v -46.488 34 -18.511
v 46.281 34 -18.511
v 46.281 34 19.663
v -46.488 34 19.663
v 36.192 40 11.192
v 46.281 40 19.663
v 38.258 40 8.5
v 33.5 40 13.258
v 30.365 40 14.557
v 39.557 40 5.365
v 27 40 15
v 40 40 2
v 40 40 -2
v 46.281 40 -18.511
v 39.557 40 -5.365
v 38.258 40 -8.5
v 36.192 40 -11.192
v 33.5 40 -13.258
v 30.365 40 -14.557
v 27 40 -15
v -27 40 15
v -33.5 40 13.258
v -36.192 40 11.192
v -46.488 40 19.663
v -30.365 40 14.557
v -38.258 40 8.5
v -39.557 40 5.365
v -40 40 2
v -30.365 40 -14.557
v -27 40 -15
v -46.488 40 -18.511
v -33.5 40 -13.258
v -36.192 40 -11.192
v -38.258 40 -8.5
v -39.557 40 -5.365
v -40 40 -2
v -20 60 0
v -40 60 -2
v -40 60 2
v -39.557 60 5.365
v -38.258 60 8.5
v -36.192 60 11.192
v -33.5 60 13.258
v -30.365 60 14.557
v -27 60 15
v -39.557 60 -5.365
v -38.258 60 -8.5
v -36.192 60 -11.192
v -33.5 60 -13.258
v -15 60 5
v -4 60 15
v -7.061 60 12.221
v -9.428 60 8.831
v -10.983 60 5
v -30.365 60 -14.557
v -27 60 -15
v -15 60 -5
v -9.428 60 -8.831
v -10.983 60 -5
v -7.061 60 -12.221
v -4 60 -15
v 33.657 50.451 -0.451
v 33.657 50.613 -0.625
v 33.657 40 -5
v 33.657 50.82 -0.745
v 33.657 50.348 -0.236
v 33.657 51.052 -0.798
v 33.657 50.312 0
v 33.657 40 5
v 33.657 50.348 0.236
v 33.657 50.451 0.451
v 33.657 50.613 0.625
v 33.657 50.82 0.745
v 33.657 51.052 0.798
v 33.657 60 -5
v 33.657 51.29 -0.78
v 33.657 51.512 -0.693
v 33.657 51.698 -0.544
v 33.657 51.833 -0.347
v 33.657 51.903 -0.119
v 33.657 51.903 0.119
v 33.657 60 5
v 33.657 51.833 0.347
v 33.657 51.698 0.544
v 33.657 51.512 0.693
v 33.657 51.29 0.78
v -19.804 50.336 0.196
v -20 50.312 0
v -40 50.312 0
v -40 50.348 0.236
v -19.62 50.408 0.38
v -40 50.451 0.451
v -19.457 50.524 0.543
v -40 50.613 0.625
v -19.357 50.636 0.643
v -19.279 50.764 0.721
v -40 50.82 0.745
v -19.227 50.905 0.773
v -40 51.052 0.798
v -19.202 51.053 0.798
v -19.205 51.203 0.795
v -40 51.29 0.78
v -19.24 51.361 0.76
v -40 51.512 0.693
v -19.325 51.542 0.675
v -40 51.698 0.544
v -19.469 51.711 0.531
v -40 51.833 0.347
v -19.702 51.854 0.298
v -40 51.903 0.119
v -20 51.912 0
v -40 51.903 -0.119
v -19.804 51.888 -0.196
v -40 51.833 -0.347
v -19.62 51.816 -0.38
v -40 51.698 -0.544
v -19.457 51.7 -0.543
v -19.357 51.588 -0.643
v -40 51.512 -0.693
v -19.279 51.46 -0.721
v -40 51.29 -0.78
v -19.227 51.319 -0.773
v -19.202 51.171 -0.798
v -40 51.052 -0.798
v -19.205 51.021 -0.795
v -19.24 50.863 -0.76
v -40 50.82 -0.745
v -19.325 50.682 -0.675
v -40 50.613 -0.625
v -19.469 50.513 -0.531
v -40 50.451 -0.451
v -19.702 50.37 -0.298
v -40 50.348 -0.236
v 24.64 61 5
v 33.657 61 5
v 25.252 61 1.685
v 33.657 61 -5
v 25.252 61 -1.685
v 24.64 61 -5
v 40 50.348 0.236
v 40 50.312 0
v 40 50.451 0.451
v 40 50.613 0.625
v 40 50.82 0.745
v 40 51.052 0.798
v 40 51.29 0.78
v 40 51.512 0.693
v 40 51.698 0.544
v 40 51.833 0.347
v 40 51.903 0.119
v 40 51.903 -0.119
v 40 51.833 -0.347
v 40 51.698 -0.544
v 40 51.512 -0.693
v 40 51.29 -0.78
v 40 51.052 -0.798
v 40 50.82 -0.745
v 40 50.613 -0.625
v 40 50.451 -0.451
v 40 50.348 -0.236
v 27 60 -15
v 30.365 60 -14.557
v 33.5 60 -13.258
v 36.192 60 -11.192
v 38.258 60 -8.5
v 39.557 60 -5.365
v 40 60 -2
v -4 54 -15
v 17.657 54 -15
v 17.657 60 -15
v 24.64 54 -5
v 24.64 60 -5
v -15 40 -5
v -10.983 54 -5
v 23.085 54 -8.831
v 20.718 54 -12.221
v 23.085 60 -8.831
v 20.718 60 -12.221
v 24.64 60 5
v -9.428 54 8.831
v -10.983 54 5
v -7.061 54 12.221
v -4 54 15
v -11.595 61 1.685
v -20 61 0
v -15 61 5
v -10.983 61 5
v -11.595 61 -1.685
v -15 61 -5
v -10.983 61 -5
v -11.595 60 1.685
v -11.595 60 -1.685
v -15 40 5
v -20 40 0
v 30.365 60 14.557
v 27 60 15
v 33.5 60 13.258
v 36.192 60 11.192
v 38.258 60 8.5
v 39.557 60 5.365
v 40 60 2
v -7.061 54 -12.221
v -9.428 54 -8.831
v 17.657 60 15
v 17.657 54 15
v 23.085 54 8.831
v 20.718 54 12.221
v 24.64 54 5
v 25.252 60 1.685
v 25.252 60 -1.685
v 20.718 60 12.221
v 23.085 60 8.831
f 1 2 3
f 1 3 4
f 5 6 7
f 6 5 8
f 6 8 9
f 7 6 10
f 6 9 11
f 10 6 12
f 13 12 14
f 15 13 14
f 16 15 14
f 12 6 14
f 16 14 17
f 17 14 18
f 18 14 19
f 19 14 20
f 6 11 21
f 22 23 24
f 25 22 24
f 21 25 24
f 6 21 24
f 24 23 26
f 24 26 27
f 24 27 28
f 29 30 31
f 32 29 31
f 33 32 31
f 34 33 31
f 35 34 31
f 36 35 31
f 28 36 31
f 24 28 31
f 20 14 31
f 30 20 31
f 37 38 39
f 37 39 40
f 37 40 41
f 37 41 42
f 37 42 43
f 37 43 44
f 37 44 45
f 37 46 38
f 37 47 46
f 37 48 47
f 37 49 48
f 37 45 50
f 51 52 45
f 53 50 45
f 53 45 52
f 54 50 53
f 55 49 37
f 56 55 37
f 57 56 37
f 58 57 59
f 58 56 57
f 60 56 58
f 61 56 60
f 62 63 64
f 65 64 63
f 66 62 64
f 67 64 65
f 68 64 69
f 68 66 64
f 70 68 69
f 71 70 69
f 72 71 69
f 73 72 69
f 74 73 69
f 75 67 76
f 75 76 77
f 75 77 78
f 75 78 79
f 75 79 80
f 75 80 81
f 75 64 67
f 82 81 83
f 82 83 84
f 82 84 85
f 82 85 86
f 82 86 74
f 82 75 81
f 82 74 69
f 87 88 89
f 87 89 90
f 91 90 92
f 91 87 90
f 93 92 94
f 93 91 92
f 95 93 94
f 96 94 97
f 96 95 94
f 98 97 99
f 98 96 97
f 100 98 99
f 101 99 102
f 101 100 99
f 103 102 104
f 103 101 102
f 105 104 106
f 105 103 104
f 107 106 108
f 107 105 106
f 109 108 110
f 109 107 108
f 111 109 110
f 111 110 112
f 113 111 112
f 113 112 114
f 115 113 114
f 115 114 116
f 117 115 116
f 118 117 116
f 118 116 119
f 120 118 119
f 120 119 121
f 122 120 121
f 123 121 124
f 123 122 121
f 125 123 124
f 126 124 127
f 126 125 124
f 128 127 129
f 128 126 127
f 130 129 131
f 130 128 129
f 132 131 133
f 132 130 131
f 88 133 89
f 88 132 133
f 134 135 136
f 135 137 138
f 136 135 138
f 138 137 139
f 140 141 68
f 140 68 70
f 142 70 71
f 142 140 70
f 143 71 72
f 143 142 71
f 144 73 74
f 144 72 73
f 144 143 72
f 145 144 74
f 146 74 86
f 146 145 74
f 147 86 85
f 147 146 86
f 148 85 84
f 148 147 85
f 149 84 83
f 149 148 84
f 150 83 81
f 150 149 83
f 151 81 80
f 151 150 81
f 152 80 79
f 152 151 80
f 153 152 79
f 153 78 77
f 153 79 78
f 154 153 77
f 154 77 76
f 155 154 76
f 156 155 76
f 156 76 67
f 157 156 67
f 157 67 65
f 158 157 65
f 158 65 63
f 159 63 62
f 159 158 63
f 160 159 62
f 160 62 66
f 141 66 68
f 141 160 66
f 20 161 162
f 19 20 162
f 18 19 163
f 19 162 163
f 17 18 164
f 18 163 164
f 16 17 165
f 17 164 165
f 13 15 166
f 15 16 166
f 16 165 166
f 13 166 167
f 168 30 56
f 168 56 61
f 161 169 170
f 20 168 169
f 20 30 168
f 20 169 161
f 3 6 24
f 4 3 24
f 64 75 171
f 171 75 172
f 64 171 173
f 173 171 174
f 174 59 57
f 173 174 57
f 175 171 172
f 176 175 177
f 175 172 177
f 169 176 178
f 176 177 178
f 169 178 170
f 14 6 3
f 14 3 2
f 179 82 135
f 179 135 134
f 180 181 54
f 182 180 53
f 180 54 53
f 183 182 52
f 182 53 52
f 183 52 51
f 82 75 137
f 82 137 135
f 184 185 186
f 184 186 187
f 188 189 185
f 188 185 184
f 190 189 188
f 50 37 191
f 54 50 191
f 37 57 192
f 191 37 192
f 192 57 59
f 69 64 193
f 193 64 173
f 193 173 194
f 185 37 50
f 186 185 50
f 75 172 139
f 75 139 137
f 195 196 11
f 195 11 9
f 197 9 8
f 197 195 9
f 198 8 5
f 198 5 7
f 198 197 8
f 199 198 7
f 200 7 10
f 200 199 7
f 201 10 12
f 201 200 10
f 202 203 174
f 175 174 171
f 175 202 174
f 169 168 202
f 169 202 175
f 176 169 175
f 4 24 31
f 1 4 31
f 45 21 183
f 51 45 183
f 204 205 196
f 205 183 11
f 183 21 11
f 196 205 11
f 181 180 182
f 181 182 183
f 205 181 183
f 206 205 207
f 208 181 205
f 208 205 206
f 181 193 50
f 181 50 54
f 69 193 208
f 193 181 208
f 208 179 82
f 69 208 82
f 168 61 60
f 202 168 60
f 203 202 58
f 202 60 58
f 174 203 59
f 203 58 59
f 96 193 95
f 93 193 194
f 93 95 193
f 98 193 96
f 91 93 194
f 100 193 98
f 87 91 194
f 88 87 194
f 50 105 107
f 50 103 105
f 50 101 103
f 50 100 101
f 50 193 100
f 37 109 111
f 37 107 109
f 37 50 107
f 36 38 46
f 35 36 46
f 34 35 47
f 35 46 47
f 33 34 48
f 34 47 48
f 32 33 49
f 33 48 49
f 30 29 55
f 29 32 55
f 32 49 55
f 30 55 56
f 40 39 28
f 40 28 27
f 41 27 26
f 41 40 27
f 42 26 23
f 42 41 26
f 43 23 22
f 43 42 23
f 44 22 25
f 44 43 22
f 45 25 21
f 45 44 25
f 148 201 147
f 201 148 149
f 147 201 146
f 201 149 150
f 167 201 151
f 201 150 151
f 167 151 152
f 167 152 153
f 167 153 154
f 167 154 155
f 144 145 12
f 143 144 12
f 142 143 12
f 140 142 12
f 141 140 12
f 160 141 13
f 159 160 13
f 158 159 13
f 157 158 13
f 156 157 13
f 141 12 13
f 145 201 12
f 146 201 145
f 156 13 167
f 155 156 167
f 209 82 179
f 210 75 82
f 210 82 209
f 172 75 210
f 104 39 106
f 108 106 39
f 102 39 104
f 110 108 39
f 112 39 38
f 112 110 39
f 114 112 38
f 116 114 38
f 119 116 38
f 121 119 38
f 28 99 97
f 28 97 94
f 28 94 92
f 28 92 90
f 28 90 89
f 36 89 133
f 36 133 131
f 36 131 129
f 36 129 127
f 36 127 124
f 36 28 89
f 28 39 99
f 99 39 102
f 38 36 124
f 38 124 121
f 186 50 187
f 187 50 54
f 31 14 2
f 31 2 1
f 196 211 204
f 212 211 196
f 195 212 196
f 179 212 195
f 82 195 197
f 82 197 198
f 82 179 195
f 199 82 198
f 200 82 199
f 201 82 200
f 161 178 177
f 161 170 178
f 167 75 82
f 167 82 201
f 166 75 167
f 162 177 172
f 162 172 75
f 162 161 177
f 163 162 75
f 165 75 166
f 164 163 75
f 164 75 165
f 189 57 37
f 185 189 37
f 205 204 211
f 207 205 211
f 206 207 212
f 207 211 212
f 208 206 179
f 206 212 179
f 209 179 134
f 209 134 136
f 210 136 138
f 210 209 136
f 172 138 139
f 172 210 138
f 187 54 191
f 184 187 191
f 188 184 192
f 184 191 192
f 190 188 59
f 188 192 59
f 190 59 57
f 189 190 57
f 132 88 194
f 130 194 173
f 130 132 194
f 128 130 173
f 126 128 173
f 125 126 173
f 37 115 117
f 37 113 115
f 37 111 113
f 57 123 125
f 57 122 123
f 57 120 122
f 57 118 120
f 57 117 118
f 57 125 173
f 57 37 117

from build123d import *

# Parameters (mm, degrees)
SKETCH1_W               = 80
SKETCH1_H               = 30
BOSS_EXTRUDE1_DEPTH     = 60
CUT_EXTRUDE1_DEPTH      = 75
CUT_EXTRUDE2_DEPTH      = 102.118742081
CUT_EXTRUDE2_DEPTH_BACK = 102.118742081
SKETCH3_R               = 0.8
FILLET1_R               = 13
SKETCH15_W              = 83.696095513
SKETCH15_H              = 31.69844841
CUT_EXTRUDE7_DEPTH      = 50
SKETCH16_W              = 92.769089126
SKETCH16_H              = 38.173794917
BOSS_EXTRUDE4_DEPTH     = 6
SKETCH18_R              = 18.5
CUT_EXTRUDE8_DEPTH      = 6
BOSS_EXTRUDE5_DEPTH     = 1
BOSS_EXTRUDE5_2_DEPTH   = 1


with BuildPart() as part:
    # Sketch1 → Boss-Extrude1 (new body)
    with BuildSketch(Plane(origin=(0, 0, 0), x_dir=(1, 0, 0), z_dir=(0, 1, 0))):
        Rectangle(SKETCH1_W, SKETCH1_H)
    extrude(amount=BOSS_EXTRUDE1_DEPTH)

    # Sketch2 → Cut-Extrude1 (cut)
    with BuildSketch(Plane(origin=(0, 60, 0), x_dir=(1, 0, 0), z_dir=(0, 1, 0))):
        Polygon((-15, 5), (15, 5), (33.657016573, 5), (33.657016573, -5), (15, -5), (-15, -5), (-20, 0), align=None)
    extrude(amount=-CUT_EXTRUDE1_DEPTH, mode=Mode.SUBTRACT)

    # Sketch3 → Cut-Extrude2 (cut, two sides: drawn at the far end of the back side and taken through both)
    with BuildSketch(Plane.ZY.offset(40).offset(-CUT_EXTRUDE2_DEPTH_BACK)):
        with Locations(Location((0, 51.111959895, 0), (0, 0, 270))):
            Circle(SKETCH3_R)
    extrude(amount=CUT_EXTRUDE2_DEPTH + CUT_EXTRUDE2_DEPTH_BACK, mode=Mode.SUBTRACT)

    # Fillet1
    fillet1_edges = [part.edges().sort_by_distance(p)[0] for p in [
        (40, 30, 15),
        (-40, 30, 15),
        (-40, 30, -15),
        (40, 30, -15),
    ]]
    fillet(fillet1_edges, radius=FILLET1_R)

    # Sketch15 → Cut-Extrude7 (cut)
    with BuildSketch(Plane(origin=(0, -10, 0), x_dir=(-1, 0, 0), z_dir=(0, -1, 0))):
        with Locations((-0.057440767, 0.030479277)):
            Rectangle(SKETCH15_W, SKETCH15_H)
    extrude(amount=-CUT_EXTRUDE7_DEPTH, mode=Mode.SUBTRACT)

    # Sketch16 → Boss-Extrude4 (add)
    with BuildSketch(Plane(origin=(0, 40, 0), x_dir=(-1, 0, 0), z_dir=(0, -1, 0))):
        with Locations((0.103396131, -0.575928298)):
            Rectangle(SKETCH16_W, SKETCH16_H)
    extrude(amount=BOSS_EXTRUDE4_DEPTH)

    # Sketch18 → Cut-Extrude8 (cut)
    with BuildSketch(Plane(origin=(0, 60, 0), x_dir=(1, 0, 0), z_dir=(0, 1, 0))):
        with Locations((6.828508286, 0)):
            Circle(SKETCH18_R)
    extrude(amount=-CUT_EXTRUDE8_DEPTH, mode=Mode.SUBTRACT)


with BuildPart() as body_2:
    # Sketch19 → Boss-Extrude5 (new body)
    with BuildSketch(Plane(origin=(0, 60, 0), x_dir=(1, 0, 0), z_dir=(0, 1, 0))):
        with BuildLine():
            Line((-10.983004844, 5), (-15, 5))
            Line((-15, 5), (-20, 0))
            Line((-20, 0), (-15, -5))
            Line((-15, -5), (-10.983004844, -5))
            ThreePointArc((-10.983004844, -5), (-11.671491714, 0), (-10.983004844, 5))
        make_face()
    extrude(amount=BOSS_EXTRUDE5_DEPTH)


with BuildPart() as body_3:
    # Sketch19 → Boss-Extrude5 2 (new body)
    with BuildSketch(Plane(origin=(0, 60, 0), x_dir=(1, 0, 0), z_dir=(0, 1, 0))):
        with BuildLine():
            Line((24.640021417, 5), (33.657016573, 5))
            Line((33.657016573, 5), (33.657016573, -5))
            Line((33.657016573, -5), (24.640021417, -5))
            ThreePointArc((24.640021417, -5), (25.328508286, 0), (24.640021417, 5))
        make_face()
    extrude(amount=BOSS_EXTRUDE5_2_DEPTH)


solid = Compound([part.part, body_2.part, body_3.part])
